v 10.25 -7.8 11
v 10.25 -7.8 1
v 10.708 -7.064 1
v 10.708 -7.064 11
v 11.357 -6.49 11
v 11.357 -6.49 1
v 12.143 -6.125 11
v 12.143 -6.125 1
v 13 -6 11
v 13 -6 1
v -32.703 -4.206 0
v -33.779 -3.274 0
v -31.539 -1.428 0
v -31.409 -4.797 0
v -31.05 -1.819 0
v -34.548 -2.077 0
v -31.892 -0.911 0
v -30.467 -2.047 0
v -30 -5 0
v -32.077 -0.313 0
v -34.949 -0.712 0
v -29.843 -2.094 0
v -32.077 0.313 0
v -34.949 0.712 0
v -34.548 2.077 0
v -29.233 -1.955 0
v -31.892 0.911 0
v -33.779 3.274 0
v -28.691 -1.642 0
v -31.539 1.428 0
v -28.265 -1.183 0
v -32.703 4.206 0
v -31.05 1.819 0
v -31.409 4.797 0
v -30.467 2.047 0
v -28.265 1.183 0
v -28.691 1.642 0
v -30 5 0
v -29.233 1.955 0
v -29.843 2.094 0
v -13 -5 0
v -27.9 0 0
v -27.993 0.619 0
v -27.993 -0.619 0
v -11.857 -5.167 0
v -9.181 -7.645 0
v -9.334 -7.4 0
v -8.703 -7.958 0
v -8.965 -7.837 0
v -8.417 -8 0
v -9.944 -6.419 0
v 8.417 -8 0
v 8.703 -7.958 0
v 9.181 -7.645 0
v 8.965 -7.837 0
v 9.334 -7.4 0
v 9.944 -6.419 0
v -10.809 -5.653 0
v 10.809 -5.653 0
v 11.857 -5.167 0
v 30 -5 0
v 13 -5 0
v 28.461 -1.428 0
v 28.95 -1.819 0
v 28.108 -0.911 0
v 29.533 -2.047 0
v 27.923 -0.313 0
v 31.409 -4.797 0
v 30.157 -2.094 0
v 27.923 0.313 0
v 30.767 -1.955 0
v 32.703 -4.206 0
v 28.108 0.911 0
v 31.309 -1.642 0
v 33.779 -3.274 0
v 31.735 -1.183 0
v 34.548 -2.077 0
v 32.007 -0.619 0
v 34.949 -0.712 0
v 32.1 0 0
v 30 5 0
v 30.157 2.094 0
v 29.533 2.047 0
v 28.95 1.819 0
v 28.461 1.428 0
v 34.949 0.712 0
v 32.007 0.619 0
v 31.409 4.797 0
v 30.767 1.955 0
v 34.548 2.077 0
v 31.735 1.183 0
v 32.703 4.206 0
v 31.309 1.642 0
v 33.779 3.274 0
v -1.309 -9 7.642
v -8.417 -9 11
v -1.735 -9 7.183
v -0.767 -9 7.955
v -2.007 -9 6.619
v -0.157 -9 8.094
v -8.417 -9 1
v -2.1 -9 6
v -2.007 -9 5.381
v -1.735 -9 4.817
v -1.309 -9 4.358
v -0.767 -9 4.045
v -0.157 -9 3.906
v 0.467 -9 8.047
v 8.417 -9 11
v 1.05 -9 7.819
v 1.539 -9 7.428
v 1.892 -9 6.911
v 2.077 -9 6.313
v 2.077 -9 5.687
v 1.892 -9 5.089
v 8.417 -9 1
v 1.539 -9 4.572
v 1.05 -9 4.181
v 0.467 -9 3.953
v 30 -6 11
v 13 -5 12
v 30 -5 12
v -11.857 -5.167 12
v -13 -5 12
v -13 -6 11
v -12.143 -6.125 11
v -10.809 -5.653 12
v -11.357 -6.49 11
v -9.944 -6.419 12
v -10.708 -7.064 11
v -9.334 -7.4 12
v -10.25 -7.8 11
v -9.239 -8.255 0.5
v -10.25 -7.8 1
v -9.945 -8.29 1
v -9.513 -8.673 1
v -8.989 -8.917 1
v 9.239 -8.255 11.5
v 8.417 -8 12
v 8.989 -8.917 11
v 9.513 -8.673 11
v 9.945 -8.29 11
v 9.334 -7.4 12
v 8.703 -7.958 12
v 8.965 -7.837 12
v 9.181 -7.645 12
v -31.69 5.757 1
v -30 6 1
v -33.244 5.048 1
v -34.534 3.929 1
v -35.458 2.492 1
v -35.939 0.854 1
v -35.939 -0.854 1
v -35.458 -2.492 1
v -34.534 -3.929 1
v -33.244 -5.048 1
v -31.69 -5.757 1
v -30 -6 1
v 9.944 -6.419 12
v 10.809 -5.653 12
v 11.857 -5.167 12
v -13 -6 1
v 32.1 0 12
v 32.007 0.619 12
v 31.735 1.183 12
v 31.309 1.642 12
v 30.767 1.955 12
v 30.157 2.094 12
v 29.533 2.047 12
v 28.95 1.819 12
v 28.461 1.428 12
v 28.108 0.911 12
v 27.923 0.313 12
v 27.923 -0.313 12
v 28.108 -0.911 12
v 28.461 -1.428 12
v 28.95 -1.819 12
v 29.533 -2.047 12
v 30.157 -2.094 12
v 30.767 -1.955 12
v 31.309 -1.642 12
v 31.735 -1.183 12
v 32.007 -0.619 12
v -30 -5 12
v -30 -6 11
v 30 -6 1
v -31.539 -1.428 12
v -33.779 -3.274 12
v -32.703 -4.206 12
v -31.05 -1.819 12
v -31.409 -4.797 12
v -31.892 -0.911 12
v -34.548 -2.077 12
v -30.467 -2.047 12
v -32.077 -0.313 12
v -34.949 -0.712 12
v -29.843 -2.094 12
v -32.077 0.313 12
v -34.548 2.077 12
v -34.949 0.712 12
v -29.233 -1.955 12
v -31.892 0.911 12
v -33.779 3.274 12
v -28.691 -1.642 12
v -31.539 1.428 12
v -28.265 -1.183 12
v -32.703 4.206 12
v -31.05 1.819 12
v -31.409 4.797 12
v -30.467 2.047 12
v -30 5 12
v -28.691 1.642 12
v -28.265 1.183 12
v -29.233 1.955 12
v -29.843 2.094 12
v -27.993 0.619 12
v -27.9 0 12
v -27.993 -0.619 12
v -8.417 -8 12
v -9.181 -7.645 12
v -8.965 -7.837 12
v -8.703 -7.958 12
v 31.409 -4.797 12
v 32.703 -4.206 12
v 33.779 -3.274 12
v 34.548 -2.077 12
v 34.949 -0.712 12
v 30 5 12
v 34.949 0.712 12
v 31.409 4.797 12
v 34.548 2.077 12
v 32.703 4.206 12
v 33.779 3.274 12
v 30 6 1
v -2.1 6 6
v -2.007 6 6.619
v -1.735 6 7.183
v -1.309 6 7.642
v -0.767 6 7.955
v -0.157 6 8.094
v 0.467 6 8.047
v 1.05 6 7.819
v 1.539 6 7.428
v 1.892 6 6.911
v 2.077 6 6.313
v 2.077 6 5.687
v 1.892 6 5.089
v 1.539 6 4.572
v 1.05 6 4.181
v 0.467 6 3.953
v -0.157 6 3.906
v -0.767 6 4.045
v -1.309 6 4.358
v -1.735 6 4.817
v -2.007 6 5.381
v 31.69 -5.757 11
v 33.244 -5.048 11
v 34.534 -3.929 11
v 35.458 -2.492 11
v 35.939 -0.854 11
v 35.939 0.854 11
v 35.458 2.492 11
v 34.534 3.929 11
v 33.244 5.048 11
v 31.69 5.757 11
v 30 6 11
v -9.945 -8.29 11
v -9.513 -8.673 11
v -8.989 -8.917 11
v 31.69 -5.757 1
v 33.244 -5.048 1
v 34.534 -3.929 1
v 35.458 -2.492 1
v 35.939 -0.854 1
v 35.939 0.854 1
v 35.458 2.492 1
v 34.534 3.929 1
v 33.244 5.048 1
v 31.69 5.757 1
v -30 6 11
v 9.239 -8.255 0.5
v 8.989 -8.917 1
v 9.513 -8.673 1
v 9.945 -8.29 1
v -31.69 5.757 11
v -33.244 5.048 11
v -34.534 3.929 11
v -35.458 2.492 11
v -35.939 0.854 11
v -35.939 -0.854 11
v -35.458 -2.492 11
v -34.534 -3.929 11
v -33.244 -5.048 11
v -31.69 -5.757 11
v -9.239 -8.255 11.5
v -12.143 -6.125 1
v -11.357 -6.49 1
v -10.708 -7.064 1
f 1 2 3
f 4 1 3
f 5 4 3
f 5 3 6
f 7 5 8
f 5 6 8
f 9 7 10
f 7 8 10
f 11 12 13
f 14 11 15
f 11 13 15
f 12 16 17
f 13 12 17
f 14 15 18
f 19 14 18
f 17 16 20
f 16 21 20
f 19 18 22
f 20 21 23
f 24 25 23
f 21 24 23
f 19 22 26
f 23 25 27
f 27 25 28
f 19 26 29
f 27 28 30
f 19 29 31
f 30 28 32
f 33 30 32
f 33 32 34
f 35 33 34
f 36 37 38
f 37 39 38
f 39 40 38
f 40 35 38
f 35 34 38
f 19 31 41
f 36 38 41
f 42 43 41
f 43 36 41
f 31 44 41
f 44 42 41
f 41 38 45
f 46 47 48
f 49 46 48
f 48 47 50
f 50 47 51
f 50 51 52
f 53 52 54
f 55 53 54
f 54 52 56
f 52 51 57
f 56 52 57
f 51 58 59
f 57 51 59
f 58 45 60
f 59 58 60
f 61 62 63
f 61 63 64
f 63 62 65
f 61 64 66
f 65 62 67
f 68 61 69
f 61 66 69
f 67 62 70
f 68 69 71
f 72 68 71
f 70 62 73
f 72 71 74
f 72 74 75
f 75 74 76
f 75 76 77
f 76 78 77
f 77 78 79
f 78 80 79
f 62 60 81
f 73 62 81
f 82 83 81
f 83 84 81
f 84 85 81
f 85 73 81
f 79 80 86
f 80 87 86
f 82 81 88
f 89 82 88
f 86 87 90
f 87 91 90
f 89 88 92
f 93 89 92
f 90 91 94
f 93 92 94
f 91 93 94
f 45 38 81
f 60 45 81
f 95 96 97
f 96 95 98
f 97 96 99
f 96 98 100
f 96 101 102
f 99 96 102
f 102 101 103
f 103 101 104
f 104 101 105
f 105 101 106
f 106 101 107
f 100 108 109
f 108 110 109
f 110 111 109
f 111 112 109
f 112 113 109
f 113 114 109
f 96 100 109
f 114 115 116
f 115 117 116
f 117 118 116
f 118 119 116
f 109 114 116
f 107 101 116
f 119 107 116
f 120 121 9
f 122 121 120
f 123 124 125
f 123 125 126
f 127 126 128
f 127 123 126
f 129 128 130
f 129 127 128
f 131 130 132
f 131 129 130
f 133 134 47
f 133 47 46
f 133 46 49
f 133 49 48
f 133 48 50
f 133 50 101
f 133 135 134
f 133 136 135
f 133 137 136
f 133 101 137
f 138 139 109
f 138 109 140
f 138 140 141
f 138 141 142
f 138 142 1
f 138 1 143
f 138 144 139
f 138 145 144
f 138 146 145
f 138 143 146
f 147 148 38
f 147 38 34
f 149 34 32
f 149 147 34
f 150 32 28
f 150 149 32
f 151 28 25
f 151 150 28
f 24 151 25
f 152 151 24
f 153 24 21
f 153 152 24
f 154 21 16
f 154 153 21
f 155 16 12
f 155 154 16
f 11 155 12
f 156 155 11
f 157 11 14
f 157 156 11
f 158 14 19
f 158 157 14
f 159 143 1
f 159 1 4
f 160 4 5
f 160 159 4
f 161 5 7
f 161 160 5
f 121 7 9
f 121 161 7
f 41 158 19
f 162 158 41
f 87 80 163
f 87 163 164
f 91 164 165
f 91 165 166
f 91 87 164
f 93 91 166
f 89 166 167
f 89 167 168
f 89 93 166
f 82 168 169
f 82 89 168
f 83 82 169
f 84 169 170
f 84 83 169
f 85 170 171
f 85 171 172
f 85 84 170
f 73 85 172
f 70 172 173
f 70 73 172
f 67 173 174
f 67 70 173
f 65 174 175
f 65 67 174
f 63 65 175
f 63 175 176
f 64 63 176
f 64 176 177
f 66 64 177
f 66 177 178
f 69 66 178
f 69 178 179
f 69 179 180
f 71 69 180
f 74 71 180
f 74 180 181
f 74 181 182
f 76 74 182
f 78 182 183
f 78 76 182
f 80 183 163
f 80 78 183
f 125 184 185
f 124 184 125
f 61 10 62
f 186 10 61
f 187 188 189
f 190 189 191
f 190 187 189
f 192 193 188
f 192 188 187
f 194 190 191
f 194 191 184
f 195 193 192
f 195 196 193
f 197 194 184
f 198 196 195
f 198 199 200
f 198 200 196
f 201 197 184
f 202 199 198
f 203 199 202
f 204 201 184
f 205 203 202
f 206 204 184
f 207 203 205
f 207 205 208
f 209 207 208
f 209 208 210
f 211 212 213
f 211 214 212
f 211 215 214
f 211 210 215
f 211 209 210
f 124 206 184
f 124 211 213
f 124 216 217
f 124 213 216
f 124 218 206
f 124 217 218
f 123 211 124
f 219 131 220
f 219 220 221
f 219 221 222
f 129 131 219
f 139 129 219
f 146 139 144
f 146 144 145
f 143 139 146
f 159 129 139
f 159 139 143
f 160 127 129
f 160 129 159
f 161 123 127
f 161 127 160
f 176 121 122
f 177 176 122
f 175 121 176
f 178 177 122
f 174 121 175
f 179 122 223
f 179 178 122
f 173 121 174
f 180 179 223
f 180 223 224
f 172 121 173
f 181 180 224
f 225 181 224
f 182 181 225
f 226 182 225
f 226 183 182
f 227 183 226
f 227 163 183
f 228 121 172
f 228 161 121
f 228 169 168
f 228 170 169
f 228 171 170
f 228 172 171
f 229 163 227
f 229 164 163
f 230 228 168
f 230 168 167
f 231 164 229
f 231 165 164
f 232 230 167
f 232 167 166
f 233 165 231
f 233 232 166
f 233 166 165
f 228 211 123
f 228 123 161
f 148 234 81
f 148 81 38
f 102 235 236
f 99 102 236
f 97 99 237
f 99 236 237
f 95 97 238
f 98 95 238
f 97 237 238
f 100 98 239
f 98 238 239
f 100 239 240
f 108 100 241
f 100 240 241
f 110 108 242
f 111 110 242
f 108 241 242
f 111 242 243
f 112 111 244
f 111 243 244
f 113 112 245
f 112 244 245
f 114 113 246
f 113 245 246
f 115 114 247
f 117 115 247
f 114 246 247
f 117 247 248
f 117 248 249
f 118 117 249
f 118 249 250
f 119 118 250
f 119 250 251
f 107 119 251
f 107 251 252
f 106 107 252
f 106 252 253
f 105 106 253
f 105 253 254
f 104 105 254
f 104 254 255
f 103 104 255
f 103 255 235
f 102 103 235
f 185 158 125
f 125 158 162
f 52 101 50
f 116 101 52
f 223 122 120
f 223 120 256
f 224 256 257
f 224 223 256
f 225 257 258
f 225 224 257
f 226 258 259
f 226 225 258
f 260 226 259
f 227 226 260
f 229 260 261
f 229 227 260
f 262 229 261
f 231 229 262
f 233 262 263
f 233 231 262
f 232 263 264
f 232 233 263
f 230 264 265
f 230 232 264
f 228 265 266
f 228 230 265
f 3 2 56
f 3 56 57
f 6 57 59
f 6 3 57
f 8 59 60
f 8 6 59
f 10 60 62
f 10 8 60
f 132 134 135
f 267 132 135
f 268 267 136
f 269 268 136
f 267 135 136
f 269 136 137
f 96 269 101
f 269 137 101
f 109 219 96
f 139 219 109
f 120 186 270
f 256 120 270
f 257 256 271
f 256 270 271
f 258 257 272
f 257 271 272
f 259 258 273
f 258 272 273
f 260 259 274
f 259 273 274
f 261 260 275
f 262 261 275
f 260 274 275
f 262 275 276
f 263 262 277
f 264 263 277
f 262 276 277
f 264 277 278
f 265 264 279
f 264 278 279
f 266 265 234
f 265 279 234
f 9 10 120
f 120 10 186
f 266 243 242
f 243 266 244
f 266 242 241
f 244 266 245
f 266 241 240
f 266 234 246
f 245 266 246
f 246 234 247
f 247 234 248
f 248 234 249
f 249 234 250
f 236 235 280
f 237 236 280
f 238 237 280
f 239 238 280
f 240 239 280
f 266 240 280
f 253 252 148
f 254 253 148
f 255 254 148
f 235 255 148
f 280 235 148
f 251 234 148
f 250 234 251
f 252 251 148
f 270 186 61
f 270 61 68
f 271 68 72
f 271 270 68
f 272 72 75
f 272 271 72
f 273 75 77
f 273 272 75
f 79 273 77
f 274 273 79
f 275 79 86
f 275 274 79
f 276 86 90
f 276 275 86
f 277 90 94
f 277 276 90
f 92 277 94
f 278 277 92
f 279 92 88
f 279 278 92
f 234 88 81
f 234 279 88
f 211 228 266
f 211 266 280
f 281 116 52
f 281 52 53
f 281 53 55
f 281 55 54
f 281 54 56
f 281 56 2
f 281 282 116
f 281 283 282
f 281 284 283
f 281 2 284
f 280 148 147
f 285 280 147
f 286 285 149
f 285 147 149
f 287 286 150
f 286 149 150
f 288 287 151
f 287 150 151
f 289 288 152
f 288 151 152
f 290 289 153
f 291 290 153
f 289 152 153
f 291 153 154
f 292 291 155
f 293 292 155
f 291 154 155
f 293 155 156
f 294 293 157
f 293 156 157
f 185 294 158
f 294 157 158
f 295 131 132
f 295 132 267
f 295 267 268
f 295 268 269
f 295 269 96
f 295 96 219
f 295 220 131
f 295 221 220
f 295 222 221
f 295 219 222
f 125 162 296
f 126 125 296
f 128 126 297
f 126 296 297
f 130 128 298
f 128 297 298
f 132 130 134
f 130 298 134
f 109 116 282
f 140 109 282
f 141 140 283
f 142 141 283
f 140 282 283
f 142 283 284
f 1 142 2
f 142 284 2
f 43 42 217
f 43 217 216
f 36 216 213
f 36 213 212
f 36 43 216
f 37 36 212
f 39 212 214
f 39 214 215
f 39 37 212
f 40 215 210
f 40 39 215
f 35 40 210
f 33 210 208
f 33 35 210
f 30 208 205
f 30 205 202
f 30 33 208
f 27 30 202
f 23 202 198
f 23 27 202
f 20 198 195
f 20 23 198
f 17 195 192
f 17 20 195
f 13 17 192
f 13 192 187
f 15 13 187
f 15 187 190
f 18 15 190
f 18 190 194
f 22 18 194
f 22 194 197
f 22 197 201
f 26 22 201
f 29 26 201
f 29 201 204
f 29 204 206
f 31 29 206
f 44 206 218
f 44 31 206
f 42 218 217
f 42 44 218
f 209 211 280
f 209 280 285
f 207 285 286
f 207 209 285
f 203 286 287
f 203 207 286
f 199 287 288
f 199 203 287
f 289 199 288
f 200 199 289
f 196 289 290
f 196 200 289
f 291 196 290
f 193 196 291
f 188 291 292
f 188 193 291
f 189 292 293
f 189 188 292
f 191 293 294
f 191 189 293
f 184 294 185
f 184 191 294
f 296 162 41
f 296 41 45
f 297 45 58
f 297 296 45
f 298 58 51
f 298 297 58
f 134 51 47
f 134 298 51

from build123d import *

# Parameters (mm, degrees)
F0_R     = 2.1
F1_DEPTH = 12
F2_R     = 2.1
F3_DEPTH = 15.001
F4_SIZE  = 1


with BuildPart() as f1:
    # F0 (on Top) → F1 (new body)
    with BuildSketch(Plane.XY):
        with BuildLine():
            Line((-8.417424, -9), (8.417424, -9))
            ThreePointArc((8.417424, -9), (9.512869, -8.67332), (10.250455, -7.8))
            ThreePointArc((10.250455, -7.8), (11.356832, -6.49002), (13, -6))
            Line((13, -6), (30, -6))
            ThreePointArc((30, -6), (36, 0), (30, 6))
            Line((30, 6), (-30, 6))
            ThreePointArc((-30, 6), (-36, 0), (-30, -6))
            Line((-30, -6), (-13, -6))
            ThreePointArc((-13, -6), (-11.356832, -6.49002), (-10.250455, -7.8))
            ThreePointArc((-10.250455, -7.8), (-9.512869, -8.67332), (-8.417424, -9))
        make_face()
        with Locations((-30, 0)):
            Circle(F0_R, mode=Mode.SUBTRACT)
        with Locations((30, 0)):
            Circle(F0_R, mode=Mode.SUBTRACT)
    extrude(amount=F1_DEPTH)

    # F2 (on face) → F3 (cut, through all)
    with BuildSketch(Plane(origin=(0, 6, 0), x_dir=(-1, 0, 0), z_dir=(0, 1, 0))):
        with Locations((0, 6)):
            Circle(F2_R)
    extrude(amount=-F3_DEPTH, mode=Mode.SUBTRACT)

    # F4
    f4_edges = [f1.edges().sort_by_distance(p)[0] for p in [
        (0, -9, 12),
        (0, 6, 0),
    ]]
    chamfer(f4_edges, length=F4_SIZE)


solid = f1.part
